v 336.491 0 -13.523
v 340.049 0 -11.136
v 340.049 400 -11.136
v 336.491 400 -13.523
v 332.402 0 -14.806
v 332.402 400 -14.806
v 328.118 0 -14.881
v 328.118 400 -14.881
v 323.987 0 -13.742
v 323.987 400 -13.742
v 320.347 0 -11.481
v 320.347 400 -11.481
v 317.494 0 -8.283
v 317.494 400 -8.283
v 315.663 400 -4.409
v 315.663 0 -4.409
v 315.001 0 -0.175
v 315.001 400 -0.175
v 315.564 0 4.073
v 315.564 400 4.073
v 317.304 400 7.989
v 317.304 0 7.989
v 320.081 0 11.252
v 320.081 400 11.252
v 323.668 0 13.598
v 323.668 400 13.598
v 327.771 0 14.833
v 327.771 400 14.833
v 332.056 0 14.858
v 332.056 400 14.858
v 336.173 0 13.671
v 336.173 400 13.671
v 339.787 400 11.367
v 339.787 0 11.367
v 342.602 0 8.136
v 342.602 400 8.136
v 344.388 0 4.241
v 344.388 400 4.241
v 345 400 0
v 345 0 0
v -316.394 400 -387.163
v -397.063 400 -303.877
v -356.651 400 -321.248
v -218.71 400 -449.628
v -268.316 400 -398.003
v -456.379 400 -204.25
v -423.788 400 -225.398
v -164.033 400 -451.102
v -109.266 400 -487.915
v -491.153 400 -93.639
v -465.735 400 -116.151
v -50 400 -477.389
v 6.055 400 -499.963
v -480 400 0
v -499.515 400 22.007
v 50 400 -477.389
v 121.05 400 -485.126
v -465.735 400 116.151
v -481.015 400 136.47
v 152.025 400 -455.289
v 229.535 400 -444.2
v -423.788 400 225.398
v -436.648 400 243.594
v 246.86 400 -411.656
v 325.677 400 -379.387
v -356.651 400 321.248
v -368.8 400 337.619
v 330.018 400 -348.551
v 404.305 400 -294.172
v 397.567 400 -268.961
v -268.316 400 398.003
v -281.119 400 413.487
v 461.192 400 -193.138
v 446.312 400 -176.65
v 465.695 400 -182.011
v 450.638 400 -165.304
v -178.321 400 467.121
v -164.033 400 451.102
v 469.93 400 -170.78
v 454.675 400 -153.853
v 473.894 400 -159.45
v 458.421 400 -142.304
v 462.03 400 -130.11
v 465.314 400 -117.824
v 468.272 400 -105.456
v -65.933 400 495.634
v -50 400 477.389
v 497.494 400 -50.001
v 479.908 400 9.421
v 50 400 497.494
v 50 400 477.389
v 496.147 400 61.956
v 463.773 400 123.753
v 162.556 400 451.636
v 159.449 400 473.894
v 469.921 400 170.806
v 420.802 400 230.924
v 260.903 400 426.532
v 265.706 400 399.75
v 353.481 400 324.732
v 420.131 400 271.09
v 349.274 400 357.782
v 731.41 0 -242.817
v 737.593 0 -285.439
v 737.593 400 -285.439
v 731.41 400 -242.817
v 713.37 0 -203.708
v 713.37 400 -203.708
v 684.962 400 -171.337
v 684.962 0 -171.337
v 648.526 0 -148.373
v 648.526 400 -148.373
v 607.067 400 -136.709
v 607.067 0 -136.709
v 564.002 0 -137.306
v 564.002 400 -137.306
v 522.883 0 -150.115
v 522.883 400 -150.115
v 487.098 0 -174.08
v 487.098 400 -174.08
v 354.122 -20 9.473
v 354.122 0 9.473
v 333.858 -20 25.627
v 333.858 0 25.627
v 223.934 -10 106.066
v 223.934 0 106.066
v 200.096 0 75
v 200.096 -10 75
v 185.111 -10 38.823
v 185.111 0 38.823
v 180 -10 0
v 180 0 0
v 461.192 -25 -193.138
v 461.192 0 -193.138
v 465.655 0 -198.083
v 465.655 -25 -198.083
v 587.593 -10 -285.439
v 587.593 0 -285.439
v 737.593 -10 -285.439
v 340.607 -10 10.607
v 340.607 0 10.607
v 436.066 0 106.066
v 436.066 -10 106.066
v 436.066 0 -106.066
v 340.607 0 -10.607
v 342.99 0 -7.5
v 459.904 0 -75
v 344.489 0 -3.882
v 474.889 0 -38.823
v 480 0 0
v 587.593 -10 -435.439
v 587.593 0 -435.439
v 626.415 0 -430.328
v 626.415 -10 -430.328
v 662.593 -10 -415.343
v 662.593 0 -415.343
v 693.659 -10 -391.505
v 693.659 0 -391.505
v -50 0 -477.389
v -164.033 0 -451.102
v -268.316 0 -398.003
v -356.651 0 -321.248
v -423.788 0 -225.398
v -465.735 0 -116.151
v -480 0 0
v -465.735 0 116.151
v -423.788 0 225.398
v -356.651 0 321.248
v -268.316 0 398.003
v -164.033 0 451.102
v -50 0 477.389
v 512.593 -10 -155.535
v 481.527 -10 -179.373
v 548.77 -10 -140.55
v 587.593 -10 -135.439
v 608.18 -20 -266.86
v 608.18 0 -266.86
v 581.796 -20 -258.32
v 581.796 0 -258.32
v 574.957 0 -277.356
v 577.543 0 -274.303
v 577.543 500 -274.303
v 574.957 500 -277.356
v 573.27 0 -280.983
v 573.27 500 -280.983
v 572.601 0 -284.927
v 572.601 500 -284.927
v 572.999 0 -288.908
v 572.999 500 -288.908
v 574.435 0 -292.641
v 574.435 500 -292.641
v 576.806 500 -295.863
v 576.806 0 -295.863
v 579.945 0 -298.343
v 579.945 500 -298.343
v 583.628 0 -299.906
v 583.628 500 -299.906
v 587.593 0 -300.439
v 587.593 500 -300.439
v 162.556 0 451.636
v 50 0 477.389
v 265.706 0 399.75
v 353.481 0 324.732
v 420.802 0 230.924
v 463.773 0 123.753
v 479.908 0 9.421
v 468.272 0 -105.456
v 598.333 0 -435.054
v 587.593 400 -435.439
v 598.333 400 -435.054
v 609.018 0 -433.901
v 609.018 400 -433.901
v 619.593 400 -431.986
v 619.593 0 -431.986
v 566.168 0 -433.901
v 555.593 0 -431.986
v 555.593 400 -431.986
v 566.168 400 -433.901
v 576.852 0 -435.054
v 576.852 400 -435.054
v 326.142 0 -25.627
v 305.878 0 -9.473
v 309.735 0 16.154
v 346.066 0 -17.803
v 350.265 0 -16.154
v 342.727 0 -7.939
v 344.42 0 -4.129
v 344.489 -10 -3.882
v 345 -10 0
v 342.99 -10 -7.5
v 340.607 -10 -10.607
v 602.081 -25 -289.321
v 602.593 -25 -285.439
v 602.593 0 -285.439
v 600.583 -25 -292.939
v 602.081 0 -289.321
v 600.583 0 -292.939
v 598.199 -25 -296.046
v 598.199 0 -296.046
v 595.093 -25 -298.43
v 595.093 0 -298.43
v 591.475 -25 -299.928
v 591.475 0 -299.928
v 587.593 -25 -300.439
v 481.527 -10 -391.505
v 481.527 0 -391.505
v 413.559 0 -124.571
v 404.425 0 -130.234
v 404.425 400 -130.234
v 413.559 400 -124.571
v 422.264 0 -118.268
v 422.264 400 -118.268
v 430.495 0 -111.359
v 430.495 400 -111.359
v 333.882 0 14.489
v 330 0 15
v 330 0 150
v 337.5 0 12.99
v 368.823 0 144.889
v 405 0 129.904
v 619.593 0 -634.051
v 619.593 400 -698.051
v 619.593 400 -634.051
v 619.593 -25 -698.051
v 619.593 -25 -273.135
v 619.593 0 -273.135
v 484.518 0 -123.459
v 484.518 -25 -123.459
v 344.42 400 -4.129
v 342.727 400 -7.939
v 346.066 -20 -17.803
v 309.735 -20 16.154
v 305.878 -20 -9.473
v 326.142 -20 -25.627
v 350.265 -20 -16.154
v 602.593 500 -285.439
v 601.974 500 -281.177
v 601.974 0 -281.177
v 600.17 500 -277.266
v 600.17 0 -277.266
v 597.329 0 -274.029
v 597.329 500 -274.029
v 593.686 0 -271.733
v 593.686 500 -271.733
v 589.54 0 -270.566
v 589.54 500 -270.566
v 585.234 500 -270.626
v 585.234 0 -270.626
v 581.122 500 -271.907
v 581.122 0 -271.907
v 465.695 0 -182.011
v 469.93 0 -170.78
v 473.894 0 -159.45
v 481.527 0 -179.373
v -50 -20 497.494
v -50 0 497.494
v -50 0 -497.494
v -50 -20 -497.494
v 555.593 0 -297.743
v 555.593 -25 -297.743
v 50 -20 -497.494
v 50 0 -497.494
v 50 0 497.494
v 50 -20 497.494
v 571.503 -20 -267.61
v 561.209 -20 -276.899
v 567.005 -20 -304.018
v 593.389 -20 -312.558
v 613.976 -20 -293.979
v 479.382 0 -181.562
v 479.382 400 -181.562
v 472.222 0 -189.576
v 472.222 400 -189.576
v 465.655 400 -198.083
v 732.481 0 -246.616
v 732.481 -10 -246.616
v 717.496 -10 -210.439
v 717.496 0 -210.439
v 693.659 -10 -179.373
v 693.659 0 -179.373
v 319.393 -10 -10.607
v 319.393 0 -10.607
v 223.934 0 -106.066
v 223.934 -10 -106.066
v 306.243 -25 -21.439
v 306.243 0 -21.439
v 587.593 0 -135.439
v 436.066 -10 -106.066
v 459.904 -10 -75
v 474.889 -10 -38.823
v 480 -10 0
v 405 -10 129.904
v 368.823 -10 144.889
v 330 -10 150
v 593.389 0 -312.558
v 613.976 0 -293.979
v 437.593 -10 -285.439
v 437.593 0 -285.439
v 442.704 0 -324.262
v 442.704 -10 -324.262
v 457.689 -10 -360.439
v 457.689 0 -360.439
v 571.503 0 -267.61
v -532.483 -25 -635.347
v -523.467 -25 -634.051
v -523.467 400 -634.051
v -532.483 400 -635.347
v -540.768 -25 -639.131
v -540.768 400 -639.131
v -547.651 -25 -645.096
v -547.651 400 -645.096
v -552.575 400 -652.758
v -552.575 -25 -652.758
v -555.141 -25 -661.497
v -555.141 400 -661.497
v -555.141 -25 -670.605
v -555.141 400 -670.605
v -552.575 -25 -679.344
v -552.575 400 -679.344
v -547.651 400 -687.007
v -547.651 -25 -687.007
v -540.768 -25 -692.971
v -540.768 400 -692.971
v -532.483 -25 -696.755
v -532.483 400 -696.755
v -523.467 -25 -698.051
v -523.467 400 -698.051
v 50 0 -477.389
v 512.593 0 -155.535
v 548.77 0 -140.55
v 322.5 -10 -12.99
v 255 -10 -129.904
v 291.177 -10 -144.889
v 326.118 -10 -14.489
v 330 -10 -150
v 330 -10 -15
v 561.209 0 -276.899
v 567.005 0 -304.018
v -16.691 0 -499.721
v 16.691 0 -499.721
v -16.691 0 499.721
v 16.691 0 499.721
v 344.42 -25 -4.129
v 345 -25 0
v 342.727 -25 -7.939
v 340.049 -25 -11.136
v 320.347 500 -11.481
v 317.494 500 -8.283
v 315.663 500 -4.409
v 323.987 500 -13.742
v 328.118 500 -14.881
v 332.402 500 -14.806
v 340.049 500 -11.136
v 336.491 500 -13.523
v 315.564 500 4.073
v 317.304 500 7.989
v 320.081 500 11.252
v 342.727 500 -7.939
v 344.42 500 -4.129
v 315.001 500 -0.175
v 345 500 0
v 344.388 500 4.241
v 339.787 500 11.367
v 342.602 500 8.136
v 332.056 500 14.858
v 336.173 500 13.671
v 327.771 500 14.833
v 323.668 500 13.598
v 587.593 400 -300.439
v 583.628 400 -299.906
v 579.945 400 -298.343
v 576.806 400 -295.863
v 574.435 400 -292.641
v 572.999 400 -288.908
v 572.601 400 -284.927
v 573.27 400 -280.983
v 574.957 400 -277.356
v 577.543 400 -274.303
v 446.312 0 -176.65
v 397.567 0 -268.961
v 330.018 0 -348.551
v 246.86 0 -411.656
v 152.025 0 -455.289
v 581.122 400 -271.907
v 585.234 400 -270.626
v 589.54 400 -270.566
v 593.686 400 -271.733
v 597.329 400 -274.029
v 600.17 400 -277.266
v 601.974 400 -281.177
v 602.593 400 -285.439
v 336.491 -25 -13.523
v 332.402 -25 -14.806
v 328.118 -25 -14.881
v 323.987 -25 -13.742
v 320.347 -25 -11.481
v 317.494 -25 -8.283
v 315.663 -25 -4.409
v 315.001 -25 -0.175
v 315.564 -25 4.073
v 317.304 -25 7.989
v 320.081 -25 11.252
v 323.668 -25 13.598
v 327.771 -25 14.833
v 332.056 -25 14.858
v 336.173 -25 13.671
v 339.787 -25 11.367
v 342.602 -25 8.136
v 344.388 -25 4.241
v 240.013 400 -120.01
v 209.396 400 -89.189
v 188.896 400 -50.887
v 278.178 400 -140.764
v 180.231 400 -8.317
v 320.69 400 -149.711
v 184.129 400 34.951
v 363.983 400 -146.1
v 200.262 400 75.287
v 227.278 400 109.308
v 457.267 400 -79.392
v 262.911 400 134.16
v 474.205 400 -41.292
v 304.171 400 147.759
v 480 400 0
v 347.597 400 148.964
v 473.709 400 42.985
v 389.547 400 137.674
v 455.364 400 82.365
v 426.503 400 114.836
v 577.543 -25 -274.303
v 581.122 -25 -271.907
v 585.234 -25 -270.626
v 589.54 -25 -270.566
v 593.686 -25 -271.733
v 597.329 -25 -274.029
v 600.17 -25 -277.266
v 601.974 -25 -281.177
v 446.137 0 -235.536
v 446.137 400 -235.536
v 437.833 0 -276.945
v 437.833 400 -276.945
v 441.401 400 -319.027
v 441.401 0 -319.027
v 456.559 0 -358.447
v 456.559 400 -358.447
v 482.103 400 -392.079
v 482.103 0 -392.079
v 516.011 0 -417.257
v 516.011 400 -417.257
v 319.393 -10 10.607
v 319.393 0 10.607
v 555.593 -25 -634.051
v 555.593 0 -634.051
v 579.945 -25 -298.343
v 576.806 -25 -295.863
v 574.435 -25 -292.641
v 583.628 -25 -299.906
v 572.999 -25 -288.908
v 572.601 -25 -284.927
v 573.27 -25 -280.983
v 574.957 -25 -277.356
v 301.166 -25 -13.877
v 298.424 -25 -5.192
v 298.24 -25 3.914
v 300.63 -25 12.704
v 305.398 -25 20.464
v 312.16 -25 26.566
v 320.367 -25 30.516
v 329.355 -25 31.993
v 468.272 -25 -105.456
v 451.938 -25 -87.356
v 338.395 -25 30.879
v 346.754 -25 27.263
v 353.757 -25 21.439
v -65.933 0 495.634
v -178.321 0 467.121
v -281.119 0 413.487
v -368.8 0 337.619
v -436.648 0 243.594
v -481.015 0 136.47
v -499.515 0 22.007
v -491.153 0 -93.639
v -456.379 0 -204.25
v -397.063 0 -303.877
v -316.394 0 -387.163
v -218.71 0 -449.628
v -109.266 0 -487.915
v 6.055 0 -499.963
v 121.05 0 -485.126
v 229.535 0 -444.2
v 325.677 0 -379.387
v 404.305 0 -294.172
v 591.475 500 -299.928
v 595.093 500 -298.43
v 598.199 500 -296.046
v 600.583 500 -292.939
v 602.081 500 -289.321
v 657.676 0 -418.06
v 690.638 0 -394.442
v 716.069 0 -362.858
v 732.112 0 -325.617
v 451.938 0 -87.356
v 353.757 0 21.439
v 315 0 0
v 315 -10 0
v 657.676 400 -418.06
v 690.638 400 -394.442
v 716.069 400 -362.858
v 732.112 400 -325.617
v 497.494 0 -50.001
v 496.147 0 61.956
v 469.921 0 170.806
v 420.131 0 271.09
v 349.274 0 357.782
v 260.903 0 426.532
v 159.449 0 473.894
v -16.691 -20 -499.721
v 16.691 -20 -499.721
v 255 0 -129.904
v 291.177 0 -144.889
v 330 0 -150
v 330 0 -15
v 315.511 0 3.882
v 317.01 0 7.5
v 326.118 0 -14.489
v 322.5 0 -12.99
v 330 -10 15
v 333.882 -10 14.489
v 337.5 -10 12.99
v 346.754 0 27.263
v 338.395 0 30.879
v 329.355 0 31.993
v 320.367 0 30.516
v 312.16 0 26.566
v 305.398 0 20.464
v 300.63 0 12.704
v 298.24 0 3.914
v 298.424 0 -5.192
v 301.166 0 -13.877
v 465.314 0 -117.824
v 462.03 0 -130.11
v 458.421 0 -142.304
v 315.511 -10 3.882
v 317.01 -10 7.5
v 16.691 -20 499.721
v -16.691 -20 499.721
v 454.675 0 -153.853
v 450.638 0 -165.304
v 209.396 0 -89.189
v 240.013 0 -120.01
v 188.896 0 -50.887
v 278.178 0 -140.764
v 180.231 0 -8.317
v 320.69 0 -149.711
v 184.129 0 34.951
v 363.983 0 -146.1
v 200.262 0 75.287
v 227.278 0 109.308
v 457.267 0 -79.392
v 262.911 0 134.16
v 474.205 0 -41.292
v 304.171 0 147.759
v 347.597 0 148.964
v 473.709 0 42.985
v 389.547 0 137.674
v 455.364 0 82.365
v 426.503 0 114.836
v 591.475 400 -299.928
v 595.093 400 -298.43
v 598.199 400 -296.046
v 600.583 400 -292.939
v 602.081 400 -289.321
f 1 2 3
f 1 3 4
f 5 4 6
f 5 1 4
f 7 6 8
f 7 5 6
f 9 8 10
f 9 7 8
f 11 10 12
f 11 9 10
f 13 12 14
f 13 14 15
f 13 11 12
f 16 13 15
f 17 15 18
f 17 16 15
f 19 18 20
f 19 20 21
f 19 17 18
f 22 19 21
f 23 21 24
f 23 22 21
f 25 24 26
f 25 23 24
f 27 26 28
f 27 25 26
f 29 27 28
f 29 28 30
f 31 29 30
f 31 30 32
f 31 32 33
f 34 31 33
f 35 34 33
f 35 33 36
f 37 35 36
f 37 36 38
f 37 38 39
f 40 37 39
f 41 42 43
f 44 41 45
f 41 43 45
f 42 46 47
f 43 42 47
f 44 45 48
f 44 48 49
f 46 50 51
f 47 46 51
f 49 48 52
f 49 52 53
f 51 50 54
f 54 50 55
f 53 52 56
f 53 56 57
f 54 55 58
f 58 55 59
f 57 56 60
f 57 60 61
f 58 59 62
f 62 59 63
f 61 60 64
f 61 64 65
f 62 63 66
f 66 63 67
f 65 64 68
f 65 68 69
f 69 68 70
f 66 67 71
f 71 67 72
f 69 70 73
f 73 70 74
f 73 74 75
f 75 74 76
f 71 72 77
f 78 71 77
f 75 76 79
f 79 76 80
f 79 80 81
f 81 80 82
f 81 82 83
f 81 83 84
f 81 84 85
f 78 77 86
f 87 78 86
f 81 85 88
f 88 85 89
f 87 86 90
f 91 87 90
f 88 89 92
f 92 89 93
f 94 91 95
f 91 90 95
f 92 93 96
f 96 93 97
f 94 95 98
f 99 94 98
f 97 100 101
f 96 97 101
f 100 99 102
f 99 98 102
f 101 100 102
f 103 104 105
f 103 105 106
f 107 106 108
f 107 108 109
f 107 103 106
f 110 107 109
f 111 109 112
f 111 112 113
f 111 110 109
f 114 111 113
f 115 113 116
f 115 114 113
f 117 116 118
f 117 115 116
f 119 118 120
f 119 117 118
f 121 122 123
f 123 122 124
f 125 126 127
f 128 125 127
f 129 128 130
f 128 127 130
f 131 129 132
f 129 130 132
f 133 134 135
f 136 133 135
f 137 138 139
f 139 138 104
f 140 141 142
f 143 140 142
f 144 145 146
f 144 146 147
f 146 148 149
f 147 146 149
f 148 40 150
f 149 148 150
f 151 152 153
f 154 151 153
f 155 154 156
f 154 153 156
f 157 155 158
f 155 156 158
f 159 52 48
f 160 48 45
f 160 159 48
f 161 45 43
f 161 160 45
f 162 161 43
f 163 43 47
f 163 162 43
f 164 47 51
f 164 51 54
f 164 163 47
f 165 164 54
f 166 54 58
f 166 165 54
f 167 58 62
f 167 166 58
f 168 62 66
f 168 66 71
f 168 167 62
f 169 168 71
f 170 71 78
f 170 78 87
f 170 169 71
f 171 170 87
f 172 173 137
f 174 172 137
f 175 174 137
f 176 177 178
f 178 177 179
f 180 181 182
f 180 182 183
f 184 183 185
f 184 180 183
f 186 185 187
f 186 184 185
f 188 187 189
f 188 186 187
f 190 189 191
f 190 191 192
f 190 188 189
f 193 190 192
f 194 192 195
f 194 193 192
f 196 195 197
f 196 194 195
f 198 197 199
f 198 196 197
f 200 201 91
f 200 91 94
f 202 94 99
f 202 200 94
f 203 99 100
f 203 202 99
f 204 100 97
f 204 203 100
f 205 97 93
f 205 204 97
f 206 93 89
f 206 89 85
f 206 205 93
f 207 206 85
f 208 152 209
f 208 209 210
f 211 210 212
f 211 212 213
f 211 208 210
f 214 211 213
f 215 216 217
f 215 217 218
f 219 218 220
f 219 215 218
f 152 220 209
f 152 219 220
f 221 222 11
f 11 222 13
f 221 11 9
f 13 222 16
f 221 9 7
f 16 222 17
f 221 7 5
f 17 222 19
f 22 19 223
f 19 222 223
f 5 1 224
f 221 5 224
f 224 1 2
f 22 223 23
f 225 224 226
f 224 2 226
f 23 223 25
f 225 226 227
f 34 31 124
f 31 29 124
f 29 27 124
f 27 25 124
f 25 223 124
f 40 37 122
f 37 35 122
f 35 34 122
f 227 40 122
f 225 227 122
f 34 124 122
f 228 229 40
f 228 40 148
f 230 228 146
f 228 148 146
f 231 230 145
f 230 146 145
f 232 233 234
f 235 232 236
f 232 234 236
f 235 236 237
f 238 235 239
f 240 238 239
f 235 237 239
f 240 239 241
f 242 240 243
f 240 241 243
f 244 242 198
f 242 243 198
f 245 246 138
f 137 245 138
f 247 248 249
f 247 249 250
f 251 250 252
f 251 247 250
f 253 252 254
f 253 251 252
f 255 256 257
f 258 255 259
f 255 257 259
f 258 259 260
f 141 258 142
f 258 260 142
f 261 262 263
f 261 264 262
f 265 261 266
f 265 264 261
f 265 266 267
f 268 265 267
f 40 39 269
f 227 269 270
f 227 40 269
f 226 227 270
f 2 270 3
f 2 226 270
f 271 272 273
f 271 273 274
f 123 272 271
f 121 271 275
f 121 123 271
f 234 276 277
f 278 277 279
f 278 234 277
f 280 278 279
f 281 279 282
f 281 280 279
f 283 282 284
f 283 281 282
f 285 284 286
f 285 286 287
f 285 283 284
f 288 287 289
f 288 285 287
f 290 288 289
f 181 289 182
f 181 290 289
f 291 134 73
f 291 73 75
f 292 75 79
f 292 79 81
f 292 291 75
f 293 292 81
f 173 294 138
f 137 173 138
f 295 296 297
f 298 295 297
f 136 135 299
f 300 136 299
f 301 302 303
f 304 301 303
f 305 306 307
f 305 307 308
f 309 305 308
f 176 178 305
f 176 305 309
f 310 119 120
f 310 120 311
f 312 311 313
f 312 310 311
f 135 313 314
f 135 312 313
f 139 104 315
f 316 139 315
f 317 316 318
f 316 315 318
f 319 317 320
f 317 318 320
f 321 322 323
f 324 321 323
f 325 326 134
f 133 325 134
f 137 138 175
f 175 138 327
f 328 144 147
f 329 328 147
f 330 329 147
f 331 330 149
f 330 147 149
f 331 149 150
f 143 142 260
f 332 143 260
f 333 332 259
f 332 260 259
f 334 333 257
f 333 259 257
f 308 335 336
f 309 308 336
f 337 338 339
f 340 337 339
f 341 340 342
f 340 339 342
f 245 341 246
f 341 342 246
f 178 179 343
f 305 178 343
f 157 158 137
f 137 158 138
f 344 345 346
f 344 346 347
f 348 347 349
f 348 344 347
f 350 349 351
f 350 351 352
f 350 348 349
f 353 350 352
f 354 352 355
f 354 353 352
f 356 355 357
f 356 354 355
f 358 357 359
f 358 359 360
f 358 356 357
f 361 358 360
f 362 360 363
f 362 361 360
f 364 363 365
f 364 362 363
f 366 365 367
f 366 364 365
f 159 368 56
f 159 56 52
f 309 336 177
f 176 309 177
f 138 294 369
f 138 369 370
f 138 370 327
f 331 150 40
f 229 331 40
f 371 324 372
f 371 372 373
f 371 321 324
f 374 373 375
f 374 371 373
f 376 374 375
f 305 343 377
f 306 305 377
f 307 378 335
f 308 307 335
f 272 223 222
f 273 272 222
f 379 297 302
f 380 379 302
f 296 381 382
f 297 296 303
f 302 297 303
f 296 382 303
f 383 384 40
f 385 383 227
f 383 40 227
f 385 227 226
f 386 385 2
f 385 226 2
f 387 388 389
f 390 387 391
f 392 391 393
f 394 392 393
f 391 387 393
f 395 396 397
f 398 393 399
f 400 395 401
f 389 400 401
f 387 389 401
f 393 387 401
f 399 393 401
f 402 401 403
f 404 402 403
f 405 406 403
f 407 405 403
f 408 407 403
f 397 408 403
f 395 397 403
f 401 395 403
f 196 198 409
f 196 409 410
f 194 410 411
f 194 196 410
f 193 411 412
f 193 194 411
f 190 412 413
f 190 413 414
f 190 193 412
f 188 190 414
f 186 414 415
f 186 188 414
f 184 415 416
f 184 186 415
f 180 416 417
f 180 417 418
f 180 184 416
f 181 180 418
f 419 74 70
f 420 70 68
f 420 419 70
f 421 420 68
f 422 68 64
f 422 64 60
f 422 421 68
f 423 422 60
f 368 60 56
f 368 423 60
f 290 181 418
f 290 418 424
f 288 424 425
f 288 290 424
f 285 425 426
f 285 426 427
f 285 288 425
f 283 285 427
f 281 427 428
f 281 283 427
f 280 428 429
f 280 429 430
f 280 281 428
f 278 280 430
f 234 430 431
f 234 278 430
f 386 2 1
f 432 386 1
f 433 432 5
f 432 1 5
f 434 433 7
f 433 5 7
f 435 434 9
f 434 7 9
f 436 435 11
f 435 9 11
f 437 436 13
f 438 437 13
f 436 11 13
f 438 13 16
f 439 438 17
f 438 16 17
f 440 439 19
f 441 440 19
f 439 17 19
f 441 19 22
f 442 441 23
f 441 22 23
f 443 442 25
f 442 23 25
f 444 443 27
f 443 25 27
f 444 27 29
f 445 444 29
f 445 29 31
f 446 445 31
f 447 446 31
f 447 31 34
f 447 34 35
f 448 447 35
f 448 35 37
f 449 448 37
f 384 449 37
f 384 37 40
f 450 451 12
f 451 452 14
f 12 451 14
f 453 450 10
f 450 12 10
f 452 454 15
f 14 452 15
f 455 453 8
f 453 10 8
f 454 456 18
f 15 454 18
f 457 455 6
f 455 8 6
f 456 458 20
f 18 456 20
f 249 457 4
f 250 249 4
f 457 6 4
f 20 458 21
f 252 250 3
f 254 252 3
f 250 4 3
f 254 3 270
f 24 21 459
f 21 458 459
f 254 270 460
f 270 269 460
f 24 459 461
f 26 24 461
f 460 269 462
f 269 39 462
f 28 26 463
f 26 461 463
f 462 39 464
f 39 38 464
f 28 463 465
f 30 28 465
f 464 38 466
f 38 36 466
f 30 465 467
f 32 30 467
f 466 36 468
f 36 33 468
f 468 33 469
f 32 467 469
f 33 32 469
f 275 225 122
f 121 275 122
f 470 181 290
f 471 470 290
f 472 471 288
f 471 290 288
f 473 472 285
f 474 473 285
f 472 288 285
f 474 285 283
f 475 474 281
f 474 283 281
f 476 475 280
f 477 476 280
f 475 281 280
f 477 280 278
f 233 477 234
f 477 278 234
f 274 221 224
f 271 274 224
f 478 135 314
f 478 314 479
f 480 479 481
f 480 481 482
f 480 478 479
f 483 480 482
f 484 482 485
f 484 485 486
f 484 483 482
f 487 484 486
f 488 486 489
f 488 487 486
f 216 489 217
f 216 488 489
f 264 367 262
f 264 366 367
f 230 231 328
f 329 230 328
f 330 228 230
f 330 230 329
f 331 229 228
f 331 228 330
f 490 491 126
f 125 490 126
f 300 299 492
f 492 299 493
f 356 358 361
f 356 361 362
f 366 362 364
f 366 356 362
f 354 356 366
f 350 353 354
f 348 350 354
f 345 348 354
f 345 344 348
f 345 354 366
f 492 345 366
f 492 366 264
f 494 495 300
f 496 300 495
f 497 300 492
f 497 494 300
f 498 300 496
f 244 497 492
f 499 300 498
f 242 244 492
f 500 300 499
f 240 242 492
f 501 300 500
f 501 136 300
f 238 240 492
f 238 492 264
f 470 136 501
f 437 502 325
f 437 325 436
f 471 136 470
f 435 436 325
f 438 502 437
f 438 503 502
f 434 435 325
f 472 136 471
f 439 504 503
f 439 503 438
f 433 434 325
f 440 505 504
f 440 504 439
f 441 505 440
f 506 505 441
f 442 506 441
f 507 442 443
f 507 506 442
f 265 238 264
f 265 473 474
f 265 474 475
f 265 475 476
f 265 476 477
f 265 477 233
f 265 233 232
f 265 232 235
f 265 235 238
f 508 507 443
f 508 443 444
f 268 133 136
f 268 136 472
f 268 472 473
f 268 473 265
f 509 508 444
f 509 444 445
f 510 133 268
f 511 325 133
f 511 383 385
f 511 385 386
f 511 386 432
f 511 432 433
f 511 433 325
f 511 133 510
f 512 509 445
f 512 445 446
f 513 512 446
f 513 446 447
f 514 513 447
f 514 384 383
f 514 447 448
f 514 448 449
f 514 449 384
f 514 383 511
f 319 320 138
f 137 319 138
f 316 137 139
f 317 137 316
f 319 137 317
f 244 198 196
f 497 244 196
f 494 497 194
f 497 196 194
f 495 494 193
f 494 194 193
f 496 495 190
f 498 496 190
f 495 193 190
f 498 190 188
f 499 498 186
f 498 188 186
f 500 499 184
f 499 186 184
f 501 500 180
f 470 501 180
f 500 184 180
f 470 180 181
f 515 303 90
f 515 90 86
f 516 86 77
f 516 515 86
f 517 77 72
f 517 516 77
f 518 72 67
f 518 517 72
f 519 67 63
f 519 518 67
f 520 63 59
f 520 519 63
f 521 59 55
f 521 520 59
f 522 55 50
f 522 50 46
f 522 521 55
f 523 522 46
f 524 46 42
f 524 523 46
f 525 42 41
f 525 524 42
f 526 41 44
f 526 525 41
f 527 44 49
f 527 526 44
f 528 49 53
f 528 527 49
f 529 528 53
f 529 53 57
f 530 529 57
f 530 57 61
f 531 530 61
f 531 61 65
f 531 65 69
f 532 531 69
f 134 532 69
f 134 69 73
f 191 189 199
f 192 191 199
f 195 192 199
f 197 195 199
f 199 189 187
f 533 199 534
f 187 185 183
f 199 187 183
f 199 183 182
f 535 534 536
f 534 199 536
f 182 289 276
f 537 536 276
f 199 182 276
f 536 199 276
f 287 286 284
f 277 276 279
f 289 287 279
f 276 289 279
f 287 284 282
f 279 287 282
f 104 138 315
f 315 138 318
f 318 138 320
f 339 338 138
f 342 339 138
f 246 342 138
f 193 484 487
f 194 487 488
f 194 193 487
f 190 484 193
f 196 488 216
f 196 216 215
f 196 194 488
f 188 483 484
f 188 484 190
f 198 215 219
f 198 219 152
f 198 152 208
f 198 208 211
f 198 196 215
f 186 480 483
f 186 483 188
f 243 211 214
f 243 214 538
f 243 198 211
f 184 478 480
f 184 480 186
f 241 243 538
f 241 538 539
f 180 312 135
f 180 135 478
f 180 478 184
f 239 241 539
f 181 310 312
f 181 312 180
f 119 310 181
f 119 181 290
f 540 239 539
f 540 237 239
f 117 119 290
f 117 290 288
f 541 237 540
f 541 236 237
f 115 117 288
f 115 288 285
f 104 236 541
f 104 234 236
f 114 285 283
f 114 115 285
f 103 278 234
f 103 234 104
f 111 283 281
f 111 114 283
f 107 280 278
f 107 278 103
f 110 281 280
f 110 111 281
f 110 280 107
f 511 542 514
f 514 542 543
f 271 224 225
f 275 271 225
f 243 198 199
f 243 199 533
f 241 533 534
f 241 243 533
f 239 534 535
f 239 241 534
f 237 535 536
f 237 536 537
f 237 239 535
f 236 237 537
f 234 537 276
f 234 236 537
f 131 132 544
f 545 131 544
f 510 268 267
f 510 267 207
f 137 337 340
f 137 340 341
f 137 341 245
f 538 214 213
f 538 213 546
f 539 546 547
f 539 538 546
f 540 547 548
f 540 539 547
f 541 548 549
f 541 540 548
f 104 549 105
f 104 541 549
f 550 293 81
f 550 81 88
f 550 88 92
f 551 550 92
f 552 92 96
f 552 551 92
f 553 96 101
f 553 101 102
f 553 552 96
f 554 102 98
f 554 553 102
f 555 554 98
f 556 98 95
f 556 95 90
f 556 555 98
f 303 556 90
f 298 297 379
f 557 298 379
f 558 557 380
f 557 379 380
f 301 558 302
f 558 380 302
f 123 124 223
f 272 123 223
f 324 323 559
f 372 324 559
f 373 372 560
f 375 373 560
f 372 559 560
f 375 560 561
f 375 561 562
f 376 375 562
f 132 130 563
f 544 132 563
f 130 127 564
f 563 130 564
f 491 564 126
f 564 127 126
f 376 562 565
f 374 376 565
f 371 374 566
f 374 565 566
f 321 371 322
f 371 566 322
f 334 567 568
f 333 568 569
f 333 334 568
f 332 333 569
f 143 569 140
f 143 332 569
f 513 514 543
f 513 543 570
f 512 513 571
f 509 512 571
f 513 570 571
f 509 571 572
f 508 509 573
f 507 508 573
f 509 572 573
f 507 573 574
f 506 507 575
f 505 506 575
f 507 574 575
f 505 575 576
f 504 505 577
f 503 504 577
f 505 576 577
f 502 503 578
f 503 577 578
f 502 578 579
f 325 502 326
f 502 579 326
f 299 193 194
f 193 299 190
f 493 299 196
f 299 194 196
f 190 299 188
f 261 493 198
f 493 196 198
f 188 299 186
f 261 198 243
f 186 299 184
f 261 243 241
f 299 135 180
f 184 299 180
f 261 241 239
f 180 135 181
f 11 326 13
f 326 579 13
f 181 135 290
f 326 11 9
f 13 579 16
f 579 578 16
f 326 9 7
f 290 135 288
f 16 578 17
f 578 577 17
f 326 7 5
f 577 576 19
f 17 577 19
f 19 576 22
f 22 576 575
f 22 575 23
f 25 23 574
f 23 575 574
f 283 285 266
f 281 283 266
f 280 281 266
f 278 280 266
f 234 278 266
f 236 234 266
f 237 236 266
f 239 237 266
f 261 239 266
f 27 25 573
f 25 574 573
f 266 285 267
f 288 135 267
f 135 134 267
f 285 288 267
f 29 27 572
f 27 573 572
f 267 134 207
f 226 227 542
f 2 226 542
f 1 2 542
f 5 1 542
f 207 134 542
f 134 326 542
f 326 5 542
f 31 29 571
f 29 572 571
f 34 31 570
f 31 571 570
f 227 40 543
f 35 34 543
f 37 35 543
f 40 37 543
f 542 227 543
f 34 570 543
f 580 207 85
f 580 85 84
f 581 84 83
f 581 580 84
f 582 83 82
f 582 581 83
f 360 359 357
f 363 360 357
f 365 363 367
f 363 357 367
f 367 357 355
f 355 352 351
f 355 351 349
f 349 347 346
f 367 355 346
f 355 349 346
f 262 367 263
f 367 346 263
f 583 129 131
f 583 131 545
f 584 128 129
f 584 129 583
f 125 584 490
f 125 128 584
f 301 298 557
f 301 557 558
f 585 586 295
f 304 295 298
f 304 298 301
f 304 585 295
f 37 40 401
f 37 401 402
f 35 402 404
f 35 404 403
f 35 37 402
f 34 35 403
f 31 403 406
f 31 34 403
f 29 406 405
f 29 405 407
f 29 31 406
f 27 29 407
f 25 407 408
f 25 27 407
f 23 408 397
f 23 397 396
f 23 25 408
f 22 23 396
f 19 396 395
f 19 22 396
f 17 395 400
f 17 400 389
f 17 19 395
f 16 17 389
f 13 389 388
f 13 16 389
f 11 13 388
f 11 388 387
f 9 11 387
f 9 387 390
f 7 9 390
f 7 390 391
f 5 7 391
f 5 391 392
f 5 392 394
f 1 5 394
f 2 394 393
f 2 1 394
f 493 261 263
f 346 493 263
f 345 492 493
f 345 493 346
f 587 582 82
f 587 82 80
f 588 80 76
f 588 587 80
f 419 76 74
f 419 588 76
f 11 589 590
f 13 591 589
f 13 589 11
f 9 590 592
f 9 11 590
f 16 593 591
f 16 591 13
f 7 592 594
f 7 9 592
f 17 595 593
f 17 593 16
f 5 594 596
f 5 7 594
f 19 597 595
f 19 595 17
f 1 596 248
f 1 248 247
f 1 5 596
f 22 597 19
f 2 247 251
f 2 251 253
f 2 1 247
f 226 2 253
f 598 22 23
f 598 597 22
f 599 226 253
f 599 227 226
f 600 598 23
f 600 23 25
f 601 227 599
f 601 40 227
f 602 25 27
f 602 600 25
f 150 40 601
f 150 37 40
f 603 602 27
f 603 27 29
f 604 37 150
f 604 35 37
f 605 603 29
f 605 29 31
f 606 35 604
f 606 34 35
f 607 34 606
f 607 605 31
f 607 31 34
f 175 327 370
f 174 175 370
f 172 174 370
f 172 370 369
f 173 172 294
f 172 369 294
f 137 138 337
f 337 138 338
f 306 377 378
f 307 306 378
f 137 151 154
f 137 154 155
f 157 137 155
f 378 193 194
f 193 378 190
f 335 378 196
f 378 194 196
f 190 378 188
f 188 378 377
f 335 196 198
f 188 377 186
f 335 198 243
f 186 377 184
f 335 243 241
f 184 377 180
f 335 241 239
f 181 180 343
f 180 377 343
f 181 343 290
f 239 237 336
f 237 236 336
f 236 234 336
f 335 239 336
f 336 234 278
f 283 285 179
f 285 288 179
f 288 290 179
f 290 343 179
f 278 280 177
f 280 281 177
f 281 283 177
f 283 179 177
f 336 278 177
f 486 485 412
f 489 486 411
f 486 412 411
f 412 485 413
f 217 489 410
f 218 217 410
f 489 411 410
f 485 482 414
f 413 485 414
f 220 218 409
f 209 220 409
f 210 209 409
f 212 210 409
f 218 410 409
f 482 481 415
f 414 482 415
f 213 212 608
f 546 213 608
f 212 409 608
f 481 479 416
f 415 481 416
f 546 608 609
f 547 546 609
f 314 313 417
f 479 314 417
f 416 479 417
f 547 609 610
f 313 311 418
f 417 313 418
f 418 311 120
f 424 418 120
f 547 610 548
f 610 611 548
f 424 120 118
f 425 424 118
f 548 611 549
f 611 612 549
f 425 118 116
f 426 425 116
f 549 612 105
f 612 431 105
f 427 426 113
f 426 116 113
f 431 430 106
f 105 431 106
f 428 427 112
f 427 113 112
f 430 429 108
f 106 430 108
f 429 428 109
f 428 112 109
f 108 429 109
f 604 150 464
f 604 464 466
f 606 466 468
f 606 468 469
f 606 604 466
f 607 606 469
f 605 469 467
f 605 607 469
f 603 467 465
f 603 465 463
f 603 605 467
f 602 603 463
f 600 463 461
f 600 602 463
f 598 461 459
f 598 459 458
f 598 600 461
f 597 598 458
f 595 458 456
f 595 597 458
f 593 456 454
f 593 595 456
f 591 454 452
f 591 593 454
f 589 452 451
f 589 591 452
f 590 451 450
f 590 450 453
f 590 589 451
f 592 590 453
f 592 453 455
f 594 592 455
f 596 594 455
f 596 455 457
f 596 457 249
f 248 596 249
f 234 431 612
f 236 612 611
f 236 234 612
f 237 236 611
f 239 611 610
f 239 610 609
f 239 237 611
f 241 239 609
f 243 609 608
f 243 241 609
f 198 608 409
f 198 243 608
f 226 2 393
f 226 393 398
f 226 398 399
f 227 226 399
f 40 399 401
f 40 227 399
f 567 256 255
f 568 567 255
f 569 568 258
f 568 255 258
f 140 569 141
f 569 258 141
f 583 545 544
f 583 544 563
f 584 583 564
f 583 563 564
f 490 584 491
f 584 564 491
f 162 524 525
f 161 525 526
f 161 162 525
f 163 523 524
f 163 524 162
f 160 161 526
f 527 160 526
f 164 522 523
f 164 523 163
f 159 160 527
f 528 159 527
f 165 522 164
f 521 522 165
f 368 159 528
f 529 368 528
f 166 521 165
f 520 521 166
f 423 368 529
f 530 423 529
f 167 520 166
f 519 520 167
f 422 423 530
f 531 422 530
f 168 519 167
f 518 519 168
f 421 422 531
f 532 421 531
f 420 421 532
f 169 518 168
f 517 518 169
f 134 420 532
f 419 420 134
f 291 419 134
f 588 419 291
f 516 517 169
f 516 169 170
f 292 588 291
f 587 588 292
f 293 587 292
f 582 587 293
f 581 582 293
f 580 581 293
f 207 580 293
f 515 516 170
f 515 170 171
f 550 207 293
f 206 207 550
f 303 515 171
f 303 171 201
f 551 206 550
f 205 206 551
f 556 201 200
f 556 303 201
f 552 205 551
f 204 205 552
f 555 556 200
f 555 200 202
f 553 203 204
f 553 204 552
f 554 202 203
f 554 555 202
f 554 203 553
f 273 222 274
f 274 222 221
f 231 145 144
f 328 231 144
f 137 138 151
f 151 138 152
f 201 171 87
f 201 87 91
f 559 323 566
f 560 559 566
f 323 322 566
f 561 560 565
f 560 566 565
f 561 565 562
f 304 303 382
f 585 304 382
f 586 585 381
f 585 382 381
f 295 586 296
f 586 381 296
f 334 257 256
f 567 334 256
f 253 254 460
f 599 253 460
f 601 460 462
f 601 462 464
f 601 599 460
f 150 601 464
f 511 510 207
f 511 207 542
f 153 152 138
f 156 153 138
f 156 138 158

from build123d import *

# Parameters (mm, degrees)
F1_DEPTH  = 25
F2_DEPTH  = 400
F3_DEPTH  = 20
F4_DEPTH  = 500
F5_DEPTH  = 500
F6_DEPTH  = 400
F7_DEPTH  = 400
F8_DEPTH  = 20
F10_DEPTH = 10


with BuildPart() as f1:
    # F0 (on Front) → F1 (new body)
    with BuildSketch(Plane.XZ):
        with BuildLine():
            Line((619.5925408203, -698.0510845184), (619.5925408203, -634.0510845184))
            Line((619.5925408203, -634.0510845184), (587.5925408203, -634.0510845184))
            Line((587.5925408203, -634.0510845184), (555.5925408203, -634.0510845184))
            Line((555.5925408203, -634.0510845184), (-523.4671831131, -634.0510845184))
            ThreePointArc((-523.4671831131, -634.0510845184), (-555.4671831131, -666.0510845184), (-523.4671831131, -698.0510845184))
            Line((-523.4671831131, -698.0510845184), (619.5925408203, -698.0510845184))
        make_face()
        with BuildLine():
            Line((571.5025570686, -267.6097967695), (487.0976257639, -174.0804081495))
            ThreePointArc((487.0976257639, -174.0804081495), (475.7304372594, -185.5048345789), (465.6545376167, -198.0828606612))
            Line((465.6545376167, -198.0828606612), (555.5925408203, -297.7434648854))
            Line((555.5925408203, -297.7434648854), (555.5925408203, -431.9860827629))
            ThreePointArc((555.5925408203, -431.9860827629), (571.4996560892, -434.5733936367), (587.5925408203, -435.4391619491))
            Line((587.5925408203, -435.4391619491), (587.5925408203, -310.6819911327))
            Line((587.5925408203, -310.6819911327), (567.0049632483, -304.0182748497))
            Line((567.0049632483, -304.0182748497), (561.2087682826, -276.8993532197))
            Line((561.2087682826, -276.8993532197), (571.5025570686, -267.6097967695))
        make_face()
        with BuildLine():
            Line((619.5925408203, -273.1348590129), (513.1676059045, -155.2050302371))
            ThreePointArc((513.1676059045, -155.2050302371), (499.6248851086, -163.9414601248), (487.0976257639, -174.0804081495))
            Line((487.0976257639, -174.0804081495), (571.5025570686, -267.6097967695))
            Line((571.5025570686, -267.6097967695), (581.7963458546, -258.3202403192))
            Line((581.7963458546, -258.3202403192), (608.1801183922, -266.8600490486))
            Line((608.1801183922, -266.8600490486), (613.9763133579, -293.9789706786))
            Line((613.9763133579, -293.9789706786), (593.388735786, -312.5580835791))
            Line((593.388735786, -312.5580835791), (587.5925408203, -310.6819911327))
            Line((587.5925408203, -310.6819911327), (587.5925408203, -435.4391619491))
            ThreePointArc((587.5925408203, -435.4391619491), (603.6854255513, -434.5733936367), (619.5925408203, -431.9860827629))
            Line((619.5925408203, -431.9860827629), (619.5925408203, -273.1348590129))
        make_face()
        with BuildLine():
            Line((487.0976257639, -174.0804081495), (473.8942746161, -159.4497302791))
            ThreePointArc((473.8942746161, -159.4497302791), (467.8463381744, -176.4080606343), (461.1917687716, -193.1376514751))
            Line((461.1917687716, -193.1376514751), (465.6545376167, -198.0828606612))
            ThreePointArc((465.6545376167, -198.0828606612), (475.7304372594, -185.5048345789), (487.0976257639, -174.0804081495))
        make_face()
        with BuildLine():
            ThreePointArc((461.1917687716, -193.1376514751), (467.8463381744, -176.4080606343), (473.8942746161, -159.4497302791))
            Line((473.8942746161, -159.4497302791), (458.4208633436, -142.3035911399))
            ThreePointArc((458.4208633436, -142.3035911399), (452.692523658, -159.5916007319), (446.3124773798, -176.6498585765))
            Line((446.3124773798, -176.6498585765), (461.1917687716, -193.1376514751))
        make_face()
        with BuildLine():
            ThreePointArc((446.3124773798, -176.6498585765), (452.692523658, -159.5916007319), (458.4208633436, -142.3035911399))
            Line((458.4208633436, -142.3035911399), (430.4949150564, -111.3587537997))
            ThreePointArc((430.4949150564, -111.3587537997), (417.9676557116, -121.4977018244), (404.4249349157, -130.234131712))
            Line((404.4249349157, -130.234131712), (446.3124773798, -176.6498585765))
        make_face()
        with BuildLine():
            ThreePointArc((458.4208633436, -142.3035911399), (463.7127179959, -123.9778817726), (468.272302341, -105.4563931693))
            Line((468.272302341, -105.4563931693), (451.9380032036, -87.356301288))
            ThreePointArc((451.9380032036, -87.356301288), (441.8621035608, -99.9343273703), (430.4949150564, -111.3587537997))
            Line((430.4949150564, -111.3587537997), (458.4208633436, -142.3035911399))
        make_face()
        with BuildLine():
            ThreePointArc((430.4949150564, -111.3587537997), (441.8621035608, -99.9343273703), (451.9380032036, -87.356301288))
            Line((451.9380032036, -87.356301288), (353.7565341439, 21.438915212))
            ThreePointArc((353.7565341439, 21.438915212), (308.561084788, 23.7565341439), (306.2434658561, -21.438915212))
            Line((306.2434658561, -21.438915212), (404.4249349157, -130.234131712))
            ThreePointArc((404.4249349157, -130.234131712), (417.9676557116, -121.4977018244), (430.4949150564, -111.3587537997))
        make_face()
        Polygon((350.264825672, -16.1542842363), (346.0662299812, -17.8030435466), (326.1423923074, -25.6269959534), (305.8775666354, -9.4727117171), (309.735174328, 16.1542842363), (333.8576076926, 25.6269959534), (354.1224333646, 9.4727117171), align=None, mode=Mode.SUBTRACT)
        with BuildLine():
            ThreePointArc((473.8942746161, -159.4497302791), (479.5440529439, -141.553881212), (484.5182852707, -123.4586215636))
            Line((484.5182852707, -123.4586215636), (468.272302341, -105.4563931693))
            ThreePointArc((468.272302341, -105.4563931693), (463.7127179959, -123.9778817726), (458.4208633436, -142.3035911399))
            Line((458.4208633436, -142.3035911399), (473.8942746161, -159.4497302791))
        make_face()
        with BuildLine():
            Line((513.1676059045, -155.2050302371), (484.5182852707, -123.4586215636))
            ThreePointArc((484.5182852707, -123.4586215636), (479.5440529439, -141.553881212), (473.8942746161, -159.4497302791))
            Line((473.8942746161, -159.4497302791), (487.0976257639, -174.0804081495))
            ThreePointArc((487.0976257639, -174.0804081495), (499.6248851086, -163.9414601248), (513.1676059045, -155.2050302371))
        make_face()
        with BuildLine():
            Line((577.5430493146, -274.3032865692), (571.5025570686, -267.6097967695))
            Line((571.5025570686, -267.6097967695), (561.2087682826, -276.8993532197))
            Line((561.2087682826, -276.8993532197), (567.0049632483, -304.0182748497))
            Line((567.0049632483, -304.0182748497), (587.5925408203, -310.6819911327))
            Line((587.5925408203, -310.6819911327), (587.5925408203, -300.4391619491))
            ThreePointArc((587.5925408203, -300.4391619491), (573.5918599315, -290.822556292), (577.5430493146, -274.3032865692))
        make_face()
        with BuildLine():
            Line((581.7963458546, -258.3202403192), (571.5025570686, -267.6097967695))
            Line((571.5025570686, -267.6097967695), (577.5430493146, -274.3032865692))
            ThreePointArc((577.5430493146, -274.3032865692), (593.6858825724, -271.7325509058), (602.5925408203, -285.4391619491))
            ThreePointArc((602.5925408203, -285.4391619491), (598.1991425381, -296.0457636669), (587.5925408203, -300.4391619491))
            Line((587.5925408203, -300.4391619491), (587.5925408203, -310.6819911327))
            Line((587.5925408203, -310.6819911327), (593.388735786, -312.5580835791))
            Line((593.388735786, -312.5580835791), (613.9763133579, -293.9789706786))
            Line((613.9763133579, -293.9789706786), (608.1801183922, -266.8600490486))
            Line((608.1801183922, -266.8600490486), (581.7963458546, -258.3202403192))
        make_face()
        Polygon((326.1423923074, -25.6269959534), (346.0662299812, -17.8030435466), (350.264825672, -16.1542842363), (354.1224333646, 9.4727117171), (333.8576076926, 25.6269959534), (309.735174328, 16.1542842363), (305.8775666354, -9.4727117171), align=None)
        with BuildLine():
            ThreePointArc((345, 0), (343.7066110433, -6.0933417521), (340.0494915056, -11.13587538))
            ThreePointArc((340.0494915056, -11.13587538), (316.2933889567, 6.0933417521), (345, 0))
        make_face(mode=Mode.SUBTRACT)
        with BuildLine():
            ThreePointArc((587.5925408203, -435.4391619491), (571.4996560892, -434.5733936367), (555.5925408203, -431.9860827629))
            Line((555.5925408203, -431.9860827629), (555.5925408203, -634.0510845184))
            Line((555.5925408203, -634.0510845184), (587.5925408203, -634.0510845184))
            Line((587.5925408203, -634.0510845184), (587.5925408203, -435.4391619491))
        make_face()
        with BuildLine():
            Line((619.5925408203, -634.0510845184), (619.5925408203, -431.9860827629))
            ThreePointArc((619.5925408203, -431.9860827629), (603.6854255513, -434.5733936367), (587.5925408203, -435.4391619491))
            Line((587.5925408203, -435.4391619491), (587.5925408203, -634.0510845184))
            Line((587.5925408203, -634.0510845184), (619.5925408203, -634.0510845184))
        make_face()
    extrude(amount=F1_DEPTH)

    # F0 (on Front) → F2 (join)
    with BuildSketch(Plane.XZ):
        with BuildLine():
            Line((619.5925408203, -698.0510845184), (619.5925408203, -634.0510845184))
            Line((619.5925408203, -634.0510845184), (587.5925408203, -634.0510845184))
            Line((587.5925408203, -634.0510845184), (555.5925408203, -634.0510845184))
            Line((555.5925408203, -634.0510845184), (-523.4671831131, -634.0510845184))
            ThreePointArc((-523.4671831131, -634.0510845184), (-555.4671831131, -666.0510845184), (-523.4671831131, -698.0510845184))
            Line((-523.4671831131, -698.0510845184), (619.5925408203, -698.0510845184))
        make_face()
    extrude(amount=-F2_DEPTH)


with BuildPart() as f3:
    # F0 (on Front) → F3 (new body)
    with BuildSketch(Plane.XZ):
        Polygon((326.1423923074, -25.6269959534), (346.0662299812, -17.8030435466), (350.264825672, -16.1542842363), (354.1224333646, 9.4727117171), (333.8576076926, 25.6269959534), (309.735174328, 16.1542842363), (305.8775666354, -9.4727117171), align=None)
        with BuildLine():
            ThreePointArc((345, 0), (343.7066110433, -6.0933417521), (340.0494915056, -11.13587538))
            ThreePointArc((340.0494915056, -11.13587538), (316.2933889567, 6.0933417521), (345, 0))
        make_face(mode=Mode.SUBTRACT)
        with BuildLine():
            ThreePointArc((345, 0), (316.2933889567, 6.0933417521), (340.0494915056, -11.13587538))
            ThreePointArc((340.0494915056, -11.13587538), (343.7066110433, -6.0933417521), (345, 0))
        make_face()
    extrude(amount=F3_DEPTH)

    # F0 (on Front) → F4 (join)
    with BuildSketch(Plane.XZ):
        with BuildLine():
            ThreePointArc((345, 0), (316.2933889567, 6.0933417521), (340.0494915056, -11.13587538))
            ThreePointArc((340.0494915056, -11.13587538), (343.7066110433, -6.0933417521), (345, 0))
        make_face()
    extrude(amount=-F4_DEPTH)


with BuildPart() as f3b:
    # F0 (on Front) → F3, piece 2 (new body)
    with BuildSketch(Plane.XZ):
        with BuildLine():
            Line((577.5430493146, -274.3032865692), (571.5025570686, -267.6097967695))
            Line((571.5025570686, -267.6097967695), (561.2087682826, -276.8993532197))
            Line((561.2087682826, -276.8993532197), (567.0049632483, -304.0182748497))
            Line((567.0049632483, -304.0182748497), (587.5925408203, -310.6819911327))
            Line((587.5925408203, -310.6819911327), (587.5925408203, -300.4391619491))
            ThreePointArc((587.5925408203, -300.4391619491), (573.5918599315, -290.822556292), (577.5430493146, -274.3032865692))
        make_face()
        with BuildLine():
            Line((581.7963458546, -258.3202403192), (571.5025570686, -267.6097967695))
            Line((571.5025570686, -267.6097967695), (577.5430493146, -274.3032865692))
            ThreePointArc((577.5430493146, -274.3032865692), (593.6858825724, -271.7325509058), (602.5925408203, -285.4391619491))
            ThreePointArc((602.5925408203, -285.4391619491), (598.1991425381, -296.0457636669), (587.5925408203, -300.4391619491))
            Line((587.5925408203, -300.4391619491), (587.5925408203, -310.6819911327))
            Line((587.5925408203, -310.6819911327), (593.388735786, -312.5580835791))
            Line((593.388735786, -312.5580835791), (613.9763133579, -293.9789706786))
            Line((613.9763133579, -293.9789706786), (608.1801183922, -266.8600490486))
            Line((608.1801183922, -266.8600490486), (581.7963458546, -258.3202403192))
        make_face()
        with BuildLine():
            ThreePointArc((602.5925408203, -285.4391619491), (593.6858825724, -271.7325509058), (577.5430493146, -274.3032865692))
            Line((577.5430493146, -274.3032865692), (587.5925408203, -285.4391619491))
            Line((587.5925408203, -285.4391619491), (587.5925408203, -300.4391619491))
            ThreePointArc((587.5925408203, -300.4391619491), (598.1991425381, -296.0457636669), (602.5925408203, -285.4391619491))
        make_face()
        with BuildLine():
            Line((587.5925408203, -285.4391619491), (577.5430493146, -274.3032865692))
            ThreePointArc((577.5430493146, -274.3032865692), (573.5918599315, -290.822556292), (587.5925408203, -300.4391619491))
            Line((587.5925408203, -300.4391619491), (587.5925408203, -285.4391619491))
        make_face()
    extrude(amount=F3_DEPTH)

    # F0 (on Front) → F5 (join)
    with BuildSketch(Plane.XZ):
        with BuildLine():
            ThreePointArc((602.5925408203, -285.4391619491), (593.6858825724, -271.7325509058), (577.5430493146, -274.3032865692))
            Line((577.5430493146, -274.3032865692), (587.5925408203, -285.4391619491))
            Line((587.5925408203, -285.4391619491), (587.5925408203, -300.4391619491))
            ThreePointArc((587.5925408203, -300.4391619491), (598.1991425381, -296.0457636669), (602.5925408203, -285.4391619491))
        make_face()
        with BuildLine():
            Line((587.5925408203, -285.4391619491), (577.5430493146, -274.3032865692))
            ThreePointArc((577.5430493146, -274.3032865692), (573.5918599315, -290.822556292), (587.5925408203, -300.4391619491))
            Line((587.5925408203, -300.4391619491), (587.5925408203, -285.4391619491))
        make_face()
    extrude(amount=-F5_DEPTH)


with BuildPart() as f6:
    # F0 (on Front) → F6 (new body)
    with BuildSketch(Plane.XZ):
        with BuildLine():
            ThreePointArc((737.5925408203, -285.4391619491), (662.879524299, -155.7014645799), (513.1676059045, -155.2050302371))
            Line((513.1676059045, -155.2050302371), (619.5925408203, -273.1348590129))
            Line((619.5925408203, -273.1348590129), (619.5925408203, -431.9860827629))
            ThreePointArc((619.5925408203, -431.9860827629), (704.4257552757, -379.5136005603), (737.5925408203, -285.4391619491))
        make_face()
        with BuildLine():
            Line((619.5925408203, -273.1348590129), (513.1676059045, -155.2050302371))
            ThreePointArc((513.1676059045, -155.2050302371), (499.6248851086, -163.9414601248), (487.0976257639, -174.0804081495))
            Line((487.0976257639, -174.0804081495), (571.5025570686, -267.6097967695))
            Line((571.5025570686, -267.6097967695), (581.7963458546, -258.3202403192))
            Line((581.7963458546, -258.3202403192), (608.1801183922, -266.8600490486))
            Line((608.1801183922, -266.8600490486), (613.9763133579, -293.9789706786))
            Line((613.9763133579, -293.9789706786), (593.388735786, -312.5580835791))
            Line((593.388735786, -312.5580835791), (587.5925408203, -310.6819911327))
            Line((587.5925408203, -310.6819911327), (587.5925408203, -435.4391619491))
            ThreePointArc((587.5925408203, -435.4391619491), (603.6854255513, -434.5733936367), (619.5925408203, -431.9860827629))
            Line((619.5925408203, -431.9860827629), (619.5925408203, -273.1348590129))
        make_face()
        with BuildLine():
            Line((571.5025570686, -267.6097967695), (487.0976257639, -174.0804081495))
            ThreePointArc((487.0976257639, -174.0804081495), (475.7304372594, -185.5048345789), (465.6545376167, -198.0828606612))
            Line((465.6545376167, -198.0828606612), (555.5925408203, -297.7434648854))
            Line((555.5925408203, -297.7434648854), (555.5925408203, -431.9860827629))
            ThreePointArc((555.5925408203, -431.9860827629), (571.4996560892, -434.5733936367), (587.5925408203, -435.4391619491))
            Line((587.5925408203, -435.4391619491), (587.5925408203, -310.6819911327))
            Line((587.5925408203, -310.6819911327), (567.0049632483, -304.0182748497))
            Line((567.0049632483, -304.0182748497), (561.2087682826, -276.8993532197))
            Line((561.2087682826, -276.8993532197), (571.5025570686, -267.6097967695))
        make_face()
        with BuildLine():
            Line((555.5925408203, -297.7434648854), (465.6545376167, -198.0828606612))
            ThreePointArc((465.6545376167, -198.0828606612), (447.5857319324, -339.2731053773), (555.5925408203, -431.9860827629))
            Line((555.5925408203, -431.9860827629), (555.5925408203, -297.7434648854))
        make_face()
        with BuildLine():
            Line((577.5430493146, -274.3032865692), (571.5025570686, -267.6097967695))
            Line((571.5025570686, -267.6097967695), (561.2087682826, -276.8993532197))
            Line((561.2087682826, -276.8993532197), (567.0049632483, -304.0182748497))
            Line((567.0049632483, -304.0182748497), (587.5925408203, -310.6819911327))
            Line((587.5925408203, -310.6819911327), (587.5925408203, -300.4391619491))
            ThreePointArc((587.5925408203, -300.4391619491), (573.5918599315, -290.822556292), (577.5430493146, -274.3032865692))
        make_face()
        with BuildLine():
            Line((581.7963458546, -258.3202403192), (571.5025570686, -267.6097967695))
            Line((571.5025570686, -267.6097967695), (577.5430493146, -274.3032865692))
            ThreePointArc((577.5430493146, -274.3032865692), (593.6858825724, -271.7325509058), (602.5925408203, -285.4391619491))
            ThreePointArc((602.5925408203, -285.4391619491), (598.1991425381, -296.0457636669), (587.5925408203, -300.4391619491))
            Line((587.5925408203, -300.4391619491), (587.5925408203, -310.6819911327))
            Line((587.5925408203, -310.6819911327), (593.388735786, -312.5580835791))
            Line((593.388735786, -312.5580835791), (613.9763133579, -293.9789706786))
            Line((613.9763133579, -293.9789706786), (608.1801183922, -266.8600490486))
            Line((608.1801183922, -266.8600490486), (581.7963458546, -258.3202403192))
        make_face()
    extrude(amount=-F6_DEPTH)


with BuildPart() as f6b:
    # F0 (on Front) → F6, piece 2 (new body)
    with BuildSketch(Plane.XZ):
        with BuildLine():
            ThreePointArc((451.9380032036, -87.356301288), (472.8122902284, -45.8764619356), (480, 0))
            ThreePointArc((480, 0), (200.2623026307, 75.2869834787), (404.4249349157, -130.234131712))
            Line((404.4249349157, -130.234131712), (306.2434658561, -21.438915212))
            ThreePointArc((306.2434658561, -21.438915212), (308.561084788, 23.7565341439), (353.7565341439, 21.438915212))
            Line((353.7565341439, 21.438915212), (451.9380032036, -87.356301288))
        make_face()
        with BuildLine():
            ThreePointArc((430.4949150564, -111.3587537997), (441.8621035608, -99.9343273703), (451.9380032036, -87.356301288))
            Line((451.9380032036, -87.356301288), (353.7565341439, 21.438915212))
            ThreePointArc((353.7565341439, 21.438915212), (308.561084788, 23.7565341439), (306.2434658561, -21.438915212))
            Line((306.2434658561, -21.438915212), (404.4249349157, -130.234131712))
            ThreePointArc((404.4249349157, -130.234131712), (417.9676557116, -121.4977018244), (430.4949150564, -111.3587537997))
        make_face()
        Polygon((350.264825672, -16.1542842363), (346.0662299812, -17.8030435466), (326.1423923074, -25.6269959534), (305.8775666354, -9.4727117171), (309.735174328, 16.1542842363), (333.8576076926, 25.6269959534), (354.1224333646, 9.4727117171), align=None, mode=Mode.SUBTRACT)
        Polygon((326.1423923074, -25.6269959534), (346.0662299812, -17.8030435466), (350.264825672, -16.1542842363), (354.1224333646, 9.4727117171), (333.8576076926, 25.6269959534), (309.735174328, 16.1542842363), (305.8775666354, -9.4727117171), align=None)
        with BuildLine():
            ThreePointArc((345, 0), (343.7066110433, -6.0933417521), (340.0494915056, -11.13587538))
            ThreePointArc((340.0494915056, -11.13587538), (316.2933889567, 6.0933417521), (345, 0))
        make_face(mode=Mode.SUBTRACT)
    extrude(amount=-F6_DEPTH)


with BuildPart() as f7:
    # F0 (on Front) → F7 (new body)
    with BuildSketch(Plane.XZ):
        with BuildLine():
            ThreePointArc((484.5182852707, -123.4586215636), (496.1144740054, -62.2127694475), (500, 0))
            ThreePointArc((500, 0), (370.8099243548, 335.410196625), (50, 497.4937185533))
            Line((50, 497.4937185533), (50, 477.3887304912))
            ThreePointArc((50, 477.3887304912), (356.6510900025, 321.2475680842), (480, 0))
            ThreePointArc((480, 0), (477.0590661143, -53.053250967), (468.272302341, -105.4563931693))
            Line((468.272302341, -105.4563931693), (484.5182852707, -123.4586215636))
        make_face()
        with BuildLine():
            ThreePointArc((473.8942746161, -159.4497302791), (479.5440529439, -141.553881212), (484.5182852707, -123.4586215636))
            Line((484.5182852707, -123.4586215636), (468.272302341, -105.4563931693))
            ThreePointArc((468.272302341, -105.4563931693), (463.7127179959, -123.9778817726), (458.4208633436, -142.3035911399))
            Line((458.4208633436, -142.3035911399), (473.8942746161, -159.4497302791))
        make_face()
        with BuildLine():
            ThreePointArc((461.1917687716, -193.1376514751), (467.8463381744, -176.4080606343), (473.8942746161, -159.4497302791))
            Line((473.8942746161, -159.4497302791), (458.4208633436, -142.3035911399))
            ThreePointArc((458.4208633436, -142.3035911399), (452.692523658, -159.5916007319), (446.3124773798, -176.6498585765))
            Line((446.3124773798, -176.6498585765), (461.1917687716, -193.1376514751))
        make_face()
        with BuildLine():
            ThreePointArc((50, -497.4937185533), (297.4683344606, -401.8862898796), (461.1917687716, -193.1376514751))
            Line((461.1917687716, -193.1376514751), (446.3124773798, -176.6498585765))
            ThreePointArc((446.3124773798, -176.6498585765), (290.1594149271, -382.3709114579), (50, -477.3887304912))
            Line((50, -477.3887304912), (50, -497.4937185533))
        make_face()
        with BuildLine():
            Line((50, 477.3887304912), (50, 497.4937185533))
            ThreePointArc((50, 497.4937185533), (0, 500), (-50, 497.4937185533))
            Line((-50, 497.4937185533), (-50, 477.3887304912))
            Line((-50, 477.3887304912), (50, 477.3887304912))
        make_face()
        with BuildLine():
            Line((-50, 477.3887304912), (-50, 497.4937185533))
            ThreePointArc((-50, 497.4937185533), (-500, 0), (-50, -497.4937185533))
            Line((-50, -497.4937185533), (-50, -477.3887304912))
            ThreePointArc((-50, -477.3887304912), (-480, 0), (-50, 477.3887304912))
        make_face()
        with BuildLine():
            Line((-50, -477.3887304912), (-50, -497.4937185533))
            ThreePointArc((-50, -497.4937185533), (0, -500), (50, -497.4937185533))
            Line((50, -497.4937185533), (50, -477.3887304912))
            Line((50, -477.3887304912), (-50, -477.3887304912))
        make_face()
    extrude(amount=-F7_DEPTH)


with BuildPart() as f8:
    # F0 (on Front) → F8 (new body)
    with BuildSketch(Plane.XZ):
        Polygon((50, 0), (50, 477.3887304912), (-50, 477.3887304912), (-50, 0), (-50, -477.3887304912), (50, -477.3887304912), align=None)
        with BuildLine():
            Line((50, 477.3887304912), (50, 497.4937185533))
            ThreePointArc((50, 497.4937185533), (0, 500), (-50, 497.4937185533))
            Line((-50, 497.4937185533), (-50, 477.3887304912))
            Line((-50, 477.3887304912), (50, 477.3887304912))
        make_face()
        with BuildLine():
            Line((-50, -477.3887304912), (-50, -497.4937185533))
            ThreePointArc((-50, -497.4937185533), (0, -500), (50, -497.4937185533))
            Line((50, -497.4937185533), (50, -477.3887304912))
            Line((50, -477.3887304912), (-50, -477.3887304912))
        make_face()
    extrude(amount=F8_DEPTH)


with BuildPart() as f10:
    # F9 (on face) → F10 (new body)
    with BuildSketch(Plane.XZ):
        with BuildLine():
            ThreePointArc((223.933982822, -106.066017178), (272.5974851452, -138.5819298767), (330, -150))
            Line((330, -150), (330, -15))
            ThreePointArc((330, -15), (324.2597485145, -13.8581929877), (319.3933982822, -10.6066017178))
            Line((319.3933982822, -10.6066017178), (223.933982822, -106.066017178))
        make_face()
    extrude(amount=F10_DEPTH)


with BuildPart() as f10b:
    # F9 (on face) → F10, piece 2 (new body)
    with BuildSketch(Plane.XZ):
        with BuildLine():
            Line((319.3933982822, 10.6066017178), (223.933982822, 106.066017178))
            ThreePointArc((223.933982822, 106.066017178), (191.4180701233, 57.4025148548), (180, 0))
            Line((180, 0), (315, 0))
            ThreePointArc((315, 0), (316.1418070123, 5.7402514855), (319.3933982822, 10.6066017178))
        make_face()
    extrude(amount=F10_DEPTH)


with BuildPart() as f10c:
    # F9 (on face) → F10, piece 3 (new body)
    with BuildSketch(Plane.XZ):
        with BuildLine():
            Line((340.6066017178, 10.6066017178), (436.066017178, 106.066017178))
            ThreePointArc((436.066017178, 106.066017178), (387.4025148548, 138.5819298767), (330, 150))
            Line((330, 150), (330, 15))
            ThreePointArc((330, 15), (335.7402514855, 13.8581929877), (340.6066017178, 10.6066017178))
        make_face()
    extrude(amount=F10_DEPTH)


with BuildPart() as f10d:
    # F9 (on face) → F10, piece 4 (new body)
    with BuildSketch(Plane.XZ):
        with BuildLine():
            ThreePointArc((436.066017178, -106.066017178), (468.5819298767, -57.4025148548), (480, 0))
            Line((480, 0), (345, 0))
            ThreePointArc((345, 0), (343.8581929877, -5.7402514855), (340.6066017178, -10.6066017178))
            Line((340.6066017178, -10.6066017178), (436.066017178, -106.066017178))
        make_face()
    extrude(amount=F10_DEPTH)


with BuildPart() as f10e:
    # F9 (on face) → F10, piece 5 (new body)
    with BuildSketch(Plane.XZ):
        with BuildLine():
            Line((481.5265236423, -391.5051791271), (587.5925408203, -285.4391619491))
            Line((587.5925408203, -285.4391619491), (437.5925408203, -285.4391619491))
            ThreePointArc((437.5925408203, -285.4391619491), (449.0106109436, -342.8416768039), (481.5265236423, -391.5051791271))
        make_face()
    extrude(amount=F10_DEPTH)


with BuildPart() as f10f:
    # F9 (on face) → F10, piece 6 (new body)
    with BuildSketch(Plane.XZ):
        with BuildLine():
            Line((481.5265236423, -179.3731447712), (587.5925408203, -285.4391619491))
            Line((587.5925408203, -285.4391619491), (587.5925408203, -135.4391619491))
            ThreePointArc((587.5925408203, -135.4391619491), (530.1900259655, -146.8572320725), (481.5265236423, -179.3731447712))
        make_face()
    extrude(amount=F10_DEPTH)


with BuildPart() as f10g:
    # F9 (on face) → F10, piece 7 (new body)
    with BuildSketch(Plane.XZ):
        with BuildLine():
            Line((587.5925408203, -285.4391619491), (737.5925408203, -285.4391619491))
            ThreePointArc((737.5925408203, -285.4391619491), (726.174470697, -228.0366470944), (693.6585579983, -179.3731447712))
            Line((693.6585579983, -179.3731447712), (587.5925408203, -285.4391619491))
        make_face()
    extrude(amount=F10_DEPTH)


with BuildPart() as f10h:
    # F9 (on face) → F10, piece 8 (new body)
    with BuildSketch(Plane.XZ):
        with BuildLine():
            ThreePointArc((587.5925408203, -435.4391619491), (644.995055675, -424.0210918258), (693.6585579983, -391.5051791271))
            Line((693.6585579983, -391.5051791271), (587.5925408203, -285.4391619491))
            Line((587.5925408203, -285.4391619491), (587.5925408203, -435.4391619491))
        make_face()
    extrude(amount=F10_DEPTH)


solid = Compound([f1.part, f3.part, f3b.part, f6.part, f6b.part, f7.part, f8.part, f10.part, f10b.part, f10c.part, f10d.part, f10e.part, f10f.part, f10g.part, f10h.part])
